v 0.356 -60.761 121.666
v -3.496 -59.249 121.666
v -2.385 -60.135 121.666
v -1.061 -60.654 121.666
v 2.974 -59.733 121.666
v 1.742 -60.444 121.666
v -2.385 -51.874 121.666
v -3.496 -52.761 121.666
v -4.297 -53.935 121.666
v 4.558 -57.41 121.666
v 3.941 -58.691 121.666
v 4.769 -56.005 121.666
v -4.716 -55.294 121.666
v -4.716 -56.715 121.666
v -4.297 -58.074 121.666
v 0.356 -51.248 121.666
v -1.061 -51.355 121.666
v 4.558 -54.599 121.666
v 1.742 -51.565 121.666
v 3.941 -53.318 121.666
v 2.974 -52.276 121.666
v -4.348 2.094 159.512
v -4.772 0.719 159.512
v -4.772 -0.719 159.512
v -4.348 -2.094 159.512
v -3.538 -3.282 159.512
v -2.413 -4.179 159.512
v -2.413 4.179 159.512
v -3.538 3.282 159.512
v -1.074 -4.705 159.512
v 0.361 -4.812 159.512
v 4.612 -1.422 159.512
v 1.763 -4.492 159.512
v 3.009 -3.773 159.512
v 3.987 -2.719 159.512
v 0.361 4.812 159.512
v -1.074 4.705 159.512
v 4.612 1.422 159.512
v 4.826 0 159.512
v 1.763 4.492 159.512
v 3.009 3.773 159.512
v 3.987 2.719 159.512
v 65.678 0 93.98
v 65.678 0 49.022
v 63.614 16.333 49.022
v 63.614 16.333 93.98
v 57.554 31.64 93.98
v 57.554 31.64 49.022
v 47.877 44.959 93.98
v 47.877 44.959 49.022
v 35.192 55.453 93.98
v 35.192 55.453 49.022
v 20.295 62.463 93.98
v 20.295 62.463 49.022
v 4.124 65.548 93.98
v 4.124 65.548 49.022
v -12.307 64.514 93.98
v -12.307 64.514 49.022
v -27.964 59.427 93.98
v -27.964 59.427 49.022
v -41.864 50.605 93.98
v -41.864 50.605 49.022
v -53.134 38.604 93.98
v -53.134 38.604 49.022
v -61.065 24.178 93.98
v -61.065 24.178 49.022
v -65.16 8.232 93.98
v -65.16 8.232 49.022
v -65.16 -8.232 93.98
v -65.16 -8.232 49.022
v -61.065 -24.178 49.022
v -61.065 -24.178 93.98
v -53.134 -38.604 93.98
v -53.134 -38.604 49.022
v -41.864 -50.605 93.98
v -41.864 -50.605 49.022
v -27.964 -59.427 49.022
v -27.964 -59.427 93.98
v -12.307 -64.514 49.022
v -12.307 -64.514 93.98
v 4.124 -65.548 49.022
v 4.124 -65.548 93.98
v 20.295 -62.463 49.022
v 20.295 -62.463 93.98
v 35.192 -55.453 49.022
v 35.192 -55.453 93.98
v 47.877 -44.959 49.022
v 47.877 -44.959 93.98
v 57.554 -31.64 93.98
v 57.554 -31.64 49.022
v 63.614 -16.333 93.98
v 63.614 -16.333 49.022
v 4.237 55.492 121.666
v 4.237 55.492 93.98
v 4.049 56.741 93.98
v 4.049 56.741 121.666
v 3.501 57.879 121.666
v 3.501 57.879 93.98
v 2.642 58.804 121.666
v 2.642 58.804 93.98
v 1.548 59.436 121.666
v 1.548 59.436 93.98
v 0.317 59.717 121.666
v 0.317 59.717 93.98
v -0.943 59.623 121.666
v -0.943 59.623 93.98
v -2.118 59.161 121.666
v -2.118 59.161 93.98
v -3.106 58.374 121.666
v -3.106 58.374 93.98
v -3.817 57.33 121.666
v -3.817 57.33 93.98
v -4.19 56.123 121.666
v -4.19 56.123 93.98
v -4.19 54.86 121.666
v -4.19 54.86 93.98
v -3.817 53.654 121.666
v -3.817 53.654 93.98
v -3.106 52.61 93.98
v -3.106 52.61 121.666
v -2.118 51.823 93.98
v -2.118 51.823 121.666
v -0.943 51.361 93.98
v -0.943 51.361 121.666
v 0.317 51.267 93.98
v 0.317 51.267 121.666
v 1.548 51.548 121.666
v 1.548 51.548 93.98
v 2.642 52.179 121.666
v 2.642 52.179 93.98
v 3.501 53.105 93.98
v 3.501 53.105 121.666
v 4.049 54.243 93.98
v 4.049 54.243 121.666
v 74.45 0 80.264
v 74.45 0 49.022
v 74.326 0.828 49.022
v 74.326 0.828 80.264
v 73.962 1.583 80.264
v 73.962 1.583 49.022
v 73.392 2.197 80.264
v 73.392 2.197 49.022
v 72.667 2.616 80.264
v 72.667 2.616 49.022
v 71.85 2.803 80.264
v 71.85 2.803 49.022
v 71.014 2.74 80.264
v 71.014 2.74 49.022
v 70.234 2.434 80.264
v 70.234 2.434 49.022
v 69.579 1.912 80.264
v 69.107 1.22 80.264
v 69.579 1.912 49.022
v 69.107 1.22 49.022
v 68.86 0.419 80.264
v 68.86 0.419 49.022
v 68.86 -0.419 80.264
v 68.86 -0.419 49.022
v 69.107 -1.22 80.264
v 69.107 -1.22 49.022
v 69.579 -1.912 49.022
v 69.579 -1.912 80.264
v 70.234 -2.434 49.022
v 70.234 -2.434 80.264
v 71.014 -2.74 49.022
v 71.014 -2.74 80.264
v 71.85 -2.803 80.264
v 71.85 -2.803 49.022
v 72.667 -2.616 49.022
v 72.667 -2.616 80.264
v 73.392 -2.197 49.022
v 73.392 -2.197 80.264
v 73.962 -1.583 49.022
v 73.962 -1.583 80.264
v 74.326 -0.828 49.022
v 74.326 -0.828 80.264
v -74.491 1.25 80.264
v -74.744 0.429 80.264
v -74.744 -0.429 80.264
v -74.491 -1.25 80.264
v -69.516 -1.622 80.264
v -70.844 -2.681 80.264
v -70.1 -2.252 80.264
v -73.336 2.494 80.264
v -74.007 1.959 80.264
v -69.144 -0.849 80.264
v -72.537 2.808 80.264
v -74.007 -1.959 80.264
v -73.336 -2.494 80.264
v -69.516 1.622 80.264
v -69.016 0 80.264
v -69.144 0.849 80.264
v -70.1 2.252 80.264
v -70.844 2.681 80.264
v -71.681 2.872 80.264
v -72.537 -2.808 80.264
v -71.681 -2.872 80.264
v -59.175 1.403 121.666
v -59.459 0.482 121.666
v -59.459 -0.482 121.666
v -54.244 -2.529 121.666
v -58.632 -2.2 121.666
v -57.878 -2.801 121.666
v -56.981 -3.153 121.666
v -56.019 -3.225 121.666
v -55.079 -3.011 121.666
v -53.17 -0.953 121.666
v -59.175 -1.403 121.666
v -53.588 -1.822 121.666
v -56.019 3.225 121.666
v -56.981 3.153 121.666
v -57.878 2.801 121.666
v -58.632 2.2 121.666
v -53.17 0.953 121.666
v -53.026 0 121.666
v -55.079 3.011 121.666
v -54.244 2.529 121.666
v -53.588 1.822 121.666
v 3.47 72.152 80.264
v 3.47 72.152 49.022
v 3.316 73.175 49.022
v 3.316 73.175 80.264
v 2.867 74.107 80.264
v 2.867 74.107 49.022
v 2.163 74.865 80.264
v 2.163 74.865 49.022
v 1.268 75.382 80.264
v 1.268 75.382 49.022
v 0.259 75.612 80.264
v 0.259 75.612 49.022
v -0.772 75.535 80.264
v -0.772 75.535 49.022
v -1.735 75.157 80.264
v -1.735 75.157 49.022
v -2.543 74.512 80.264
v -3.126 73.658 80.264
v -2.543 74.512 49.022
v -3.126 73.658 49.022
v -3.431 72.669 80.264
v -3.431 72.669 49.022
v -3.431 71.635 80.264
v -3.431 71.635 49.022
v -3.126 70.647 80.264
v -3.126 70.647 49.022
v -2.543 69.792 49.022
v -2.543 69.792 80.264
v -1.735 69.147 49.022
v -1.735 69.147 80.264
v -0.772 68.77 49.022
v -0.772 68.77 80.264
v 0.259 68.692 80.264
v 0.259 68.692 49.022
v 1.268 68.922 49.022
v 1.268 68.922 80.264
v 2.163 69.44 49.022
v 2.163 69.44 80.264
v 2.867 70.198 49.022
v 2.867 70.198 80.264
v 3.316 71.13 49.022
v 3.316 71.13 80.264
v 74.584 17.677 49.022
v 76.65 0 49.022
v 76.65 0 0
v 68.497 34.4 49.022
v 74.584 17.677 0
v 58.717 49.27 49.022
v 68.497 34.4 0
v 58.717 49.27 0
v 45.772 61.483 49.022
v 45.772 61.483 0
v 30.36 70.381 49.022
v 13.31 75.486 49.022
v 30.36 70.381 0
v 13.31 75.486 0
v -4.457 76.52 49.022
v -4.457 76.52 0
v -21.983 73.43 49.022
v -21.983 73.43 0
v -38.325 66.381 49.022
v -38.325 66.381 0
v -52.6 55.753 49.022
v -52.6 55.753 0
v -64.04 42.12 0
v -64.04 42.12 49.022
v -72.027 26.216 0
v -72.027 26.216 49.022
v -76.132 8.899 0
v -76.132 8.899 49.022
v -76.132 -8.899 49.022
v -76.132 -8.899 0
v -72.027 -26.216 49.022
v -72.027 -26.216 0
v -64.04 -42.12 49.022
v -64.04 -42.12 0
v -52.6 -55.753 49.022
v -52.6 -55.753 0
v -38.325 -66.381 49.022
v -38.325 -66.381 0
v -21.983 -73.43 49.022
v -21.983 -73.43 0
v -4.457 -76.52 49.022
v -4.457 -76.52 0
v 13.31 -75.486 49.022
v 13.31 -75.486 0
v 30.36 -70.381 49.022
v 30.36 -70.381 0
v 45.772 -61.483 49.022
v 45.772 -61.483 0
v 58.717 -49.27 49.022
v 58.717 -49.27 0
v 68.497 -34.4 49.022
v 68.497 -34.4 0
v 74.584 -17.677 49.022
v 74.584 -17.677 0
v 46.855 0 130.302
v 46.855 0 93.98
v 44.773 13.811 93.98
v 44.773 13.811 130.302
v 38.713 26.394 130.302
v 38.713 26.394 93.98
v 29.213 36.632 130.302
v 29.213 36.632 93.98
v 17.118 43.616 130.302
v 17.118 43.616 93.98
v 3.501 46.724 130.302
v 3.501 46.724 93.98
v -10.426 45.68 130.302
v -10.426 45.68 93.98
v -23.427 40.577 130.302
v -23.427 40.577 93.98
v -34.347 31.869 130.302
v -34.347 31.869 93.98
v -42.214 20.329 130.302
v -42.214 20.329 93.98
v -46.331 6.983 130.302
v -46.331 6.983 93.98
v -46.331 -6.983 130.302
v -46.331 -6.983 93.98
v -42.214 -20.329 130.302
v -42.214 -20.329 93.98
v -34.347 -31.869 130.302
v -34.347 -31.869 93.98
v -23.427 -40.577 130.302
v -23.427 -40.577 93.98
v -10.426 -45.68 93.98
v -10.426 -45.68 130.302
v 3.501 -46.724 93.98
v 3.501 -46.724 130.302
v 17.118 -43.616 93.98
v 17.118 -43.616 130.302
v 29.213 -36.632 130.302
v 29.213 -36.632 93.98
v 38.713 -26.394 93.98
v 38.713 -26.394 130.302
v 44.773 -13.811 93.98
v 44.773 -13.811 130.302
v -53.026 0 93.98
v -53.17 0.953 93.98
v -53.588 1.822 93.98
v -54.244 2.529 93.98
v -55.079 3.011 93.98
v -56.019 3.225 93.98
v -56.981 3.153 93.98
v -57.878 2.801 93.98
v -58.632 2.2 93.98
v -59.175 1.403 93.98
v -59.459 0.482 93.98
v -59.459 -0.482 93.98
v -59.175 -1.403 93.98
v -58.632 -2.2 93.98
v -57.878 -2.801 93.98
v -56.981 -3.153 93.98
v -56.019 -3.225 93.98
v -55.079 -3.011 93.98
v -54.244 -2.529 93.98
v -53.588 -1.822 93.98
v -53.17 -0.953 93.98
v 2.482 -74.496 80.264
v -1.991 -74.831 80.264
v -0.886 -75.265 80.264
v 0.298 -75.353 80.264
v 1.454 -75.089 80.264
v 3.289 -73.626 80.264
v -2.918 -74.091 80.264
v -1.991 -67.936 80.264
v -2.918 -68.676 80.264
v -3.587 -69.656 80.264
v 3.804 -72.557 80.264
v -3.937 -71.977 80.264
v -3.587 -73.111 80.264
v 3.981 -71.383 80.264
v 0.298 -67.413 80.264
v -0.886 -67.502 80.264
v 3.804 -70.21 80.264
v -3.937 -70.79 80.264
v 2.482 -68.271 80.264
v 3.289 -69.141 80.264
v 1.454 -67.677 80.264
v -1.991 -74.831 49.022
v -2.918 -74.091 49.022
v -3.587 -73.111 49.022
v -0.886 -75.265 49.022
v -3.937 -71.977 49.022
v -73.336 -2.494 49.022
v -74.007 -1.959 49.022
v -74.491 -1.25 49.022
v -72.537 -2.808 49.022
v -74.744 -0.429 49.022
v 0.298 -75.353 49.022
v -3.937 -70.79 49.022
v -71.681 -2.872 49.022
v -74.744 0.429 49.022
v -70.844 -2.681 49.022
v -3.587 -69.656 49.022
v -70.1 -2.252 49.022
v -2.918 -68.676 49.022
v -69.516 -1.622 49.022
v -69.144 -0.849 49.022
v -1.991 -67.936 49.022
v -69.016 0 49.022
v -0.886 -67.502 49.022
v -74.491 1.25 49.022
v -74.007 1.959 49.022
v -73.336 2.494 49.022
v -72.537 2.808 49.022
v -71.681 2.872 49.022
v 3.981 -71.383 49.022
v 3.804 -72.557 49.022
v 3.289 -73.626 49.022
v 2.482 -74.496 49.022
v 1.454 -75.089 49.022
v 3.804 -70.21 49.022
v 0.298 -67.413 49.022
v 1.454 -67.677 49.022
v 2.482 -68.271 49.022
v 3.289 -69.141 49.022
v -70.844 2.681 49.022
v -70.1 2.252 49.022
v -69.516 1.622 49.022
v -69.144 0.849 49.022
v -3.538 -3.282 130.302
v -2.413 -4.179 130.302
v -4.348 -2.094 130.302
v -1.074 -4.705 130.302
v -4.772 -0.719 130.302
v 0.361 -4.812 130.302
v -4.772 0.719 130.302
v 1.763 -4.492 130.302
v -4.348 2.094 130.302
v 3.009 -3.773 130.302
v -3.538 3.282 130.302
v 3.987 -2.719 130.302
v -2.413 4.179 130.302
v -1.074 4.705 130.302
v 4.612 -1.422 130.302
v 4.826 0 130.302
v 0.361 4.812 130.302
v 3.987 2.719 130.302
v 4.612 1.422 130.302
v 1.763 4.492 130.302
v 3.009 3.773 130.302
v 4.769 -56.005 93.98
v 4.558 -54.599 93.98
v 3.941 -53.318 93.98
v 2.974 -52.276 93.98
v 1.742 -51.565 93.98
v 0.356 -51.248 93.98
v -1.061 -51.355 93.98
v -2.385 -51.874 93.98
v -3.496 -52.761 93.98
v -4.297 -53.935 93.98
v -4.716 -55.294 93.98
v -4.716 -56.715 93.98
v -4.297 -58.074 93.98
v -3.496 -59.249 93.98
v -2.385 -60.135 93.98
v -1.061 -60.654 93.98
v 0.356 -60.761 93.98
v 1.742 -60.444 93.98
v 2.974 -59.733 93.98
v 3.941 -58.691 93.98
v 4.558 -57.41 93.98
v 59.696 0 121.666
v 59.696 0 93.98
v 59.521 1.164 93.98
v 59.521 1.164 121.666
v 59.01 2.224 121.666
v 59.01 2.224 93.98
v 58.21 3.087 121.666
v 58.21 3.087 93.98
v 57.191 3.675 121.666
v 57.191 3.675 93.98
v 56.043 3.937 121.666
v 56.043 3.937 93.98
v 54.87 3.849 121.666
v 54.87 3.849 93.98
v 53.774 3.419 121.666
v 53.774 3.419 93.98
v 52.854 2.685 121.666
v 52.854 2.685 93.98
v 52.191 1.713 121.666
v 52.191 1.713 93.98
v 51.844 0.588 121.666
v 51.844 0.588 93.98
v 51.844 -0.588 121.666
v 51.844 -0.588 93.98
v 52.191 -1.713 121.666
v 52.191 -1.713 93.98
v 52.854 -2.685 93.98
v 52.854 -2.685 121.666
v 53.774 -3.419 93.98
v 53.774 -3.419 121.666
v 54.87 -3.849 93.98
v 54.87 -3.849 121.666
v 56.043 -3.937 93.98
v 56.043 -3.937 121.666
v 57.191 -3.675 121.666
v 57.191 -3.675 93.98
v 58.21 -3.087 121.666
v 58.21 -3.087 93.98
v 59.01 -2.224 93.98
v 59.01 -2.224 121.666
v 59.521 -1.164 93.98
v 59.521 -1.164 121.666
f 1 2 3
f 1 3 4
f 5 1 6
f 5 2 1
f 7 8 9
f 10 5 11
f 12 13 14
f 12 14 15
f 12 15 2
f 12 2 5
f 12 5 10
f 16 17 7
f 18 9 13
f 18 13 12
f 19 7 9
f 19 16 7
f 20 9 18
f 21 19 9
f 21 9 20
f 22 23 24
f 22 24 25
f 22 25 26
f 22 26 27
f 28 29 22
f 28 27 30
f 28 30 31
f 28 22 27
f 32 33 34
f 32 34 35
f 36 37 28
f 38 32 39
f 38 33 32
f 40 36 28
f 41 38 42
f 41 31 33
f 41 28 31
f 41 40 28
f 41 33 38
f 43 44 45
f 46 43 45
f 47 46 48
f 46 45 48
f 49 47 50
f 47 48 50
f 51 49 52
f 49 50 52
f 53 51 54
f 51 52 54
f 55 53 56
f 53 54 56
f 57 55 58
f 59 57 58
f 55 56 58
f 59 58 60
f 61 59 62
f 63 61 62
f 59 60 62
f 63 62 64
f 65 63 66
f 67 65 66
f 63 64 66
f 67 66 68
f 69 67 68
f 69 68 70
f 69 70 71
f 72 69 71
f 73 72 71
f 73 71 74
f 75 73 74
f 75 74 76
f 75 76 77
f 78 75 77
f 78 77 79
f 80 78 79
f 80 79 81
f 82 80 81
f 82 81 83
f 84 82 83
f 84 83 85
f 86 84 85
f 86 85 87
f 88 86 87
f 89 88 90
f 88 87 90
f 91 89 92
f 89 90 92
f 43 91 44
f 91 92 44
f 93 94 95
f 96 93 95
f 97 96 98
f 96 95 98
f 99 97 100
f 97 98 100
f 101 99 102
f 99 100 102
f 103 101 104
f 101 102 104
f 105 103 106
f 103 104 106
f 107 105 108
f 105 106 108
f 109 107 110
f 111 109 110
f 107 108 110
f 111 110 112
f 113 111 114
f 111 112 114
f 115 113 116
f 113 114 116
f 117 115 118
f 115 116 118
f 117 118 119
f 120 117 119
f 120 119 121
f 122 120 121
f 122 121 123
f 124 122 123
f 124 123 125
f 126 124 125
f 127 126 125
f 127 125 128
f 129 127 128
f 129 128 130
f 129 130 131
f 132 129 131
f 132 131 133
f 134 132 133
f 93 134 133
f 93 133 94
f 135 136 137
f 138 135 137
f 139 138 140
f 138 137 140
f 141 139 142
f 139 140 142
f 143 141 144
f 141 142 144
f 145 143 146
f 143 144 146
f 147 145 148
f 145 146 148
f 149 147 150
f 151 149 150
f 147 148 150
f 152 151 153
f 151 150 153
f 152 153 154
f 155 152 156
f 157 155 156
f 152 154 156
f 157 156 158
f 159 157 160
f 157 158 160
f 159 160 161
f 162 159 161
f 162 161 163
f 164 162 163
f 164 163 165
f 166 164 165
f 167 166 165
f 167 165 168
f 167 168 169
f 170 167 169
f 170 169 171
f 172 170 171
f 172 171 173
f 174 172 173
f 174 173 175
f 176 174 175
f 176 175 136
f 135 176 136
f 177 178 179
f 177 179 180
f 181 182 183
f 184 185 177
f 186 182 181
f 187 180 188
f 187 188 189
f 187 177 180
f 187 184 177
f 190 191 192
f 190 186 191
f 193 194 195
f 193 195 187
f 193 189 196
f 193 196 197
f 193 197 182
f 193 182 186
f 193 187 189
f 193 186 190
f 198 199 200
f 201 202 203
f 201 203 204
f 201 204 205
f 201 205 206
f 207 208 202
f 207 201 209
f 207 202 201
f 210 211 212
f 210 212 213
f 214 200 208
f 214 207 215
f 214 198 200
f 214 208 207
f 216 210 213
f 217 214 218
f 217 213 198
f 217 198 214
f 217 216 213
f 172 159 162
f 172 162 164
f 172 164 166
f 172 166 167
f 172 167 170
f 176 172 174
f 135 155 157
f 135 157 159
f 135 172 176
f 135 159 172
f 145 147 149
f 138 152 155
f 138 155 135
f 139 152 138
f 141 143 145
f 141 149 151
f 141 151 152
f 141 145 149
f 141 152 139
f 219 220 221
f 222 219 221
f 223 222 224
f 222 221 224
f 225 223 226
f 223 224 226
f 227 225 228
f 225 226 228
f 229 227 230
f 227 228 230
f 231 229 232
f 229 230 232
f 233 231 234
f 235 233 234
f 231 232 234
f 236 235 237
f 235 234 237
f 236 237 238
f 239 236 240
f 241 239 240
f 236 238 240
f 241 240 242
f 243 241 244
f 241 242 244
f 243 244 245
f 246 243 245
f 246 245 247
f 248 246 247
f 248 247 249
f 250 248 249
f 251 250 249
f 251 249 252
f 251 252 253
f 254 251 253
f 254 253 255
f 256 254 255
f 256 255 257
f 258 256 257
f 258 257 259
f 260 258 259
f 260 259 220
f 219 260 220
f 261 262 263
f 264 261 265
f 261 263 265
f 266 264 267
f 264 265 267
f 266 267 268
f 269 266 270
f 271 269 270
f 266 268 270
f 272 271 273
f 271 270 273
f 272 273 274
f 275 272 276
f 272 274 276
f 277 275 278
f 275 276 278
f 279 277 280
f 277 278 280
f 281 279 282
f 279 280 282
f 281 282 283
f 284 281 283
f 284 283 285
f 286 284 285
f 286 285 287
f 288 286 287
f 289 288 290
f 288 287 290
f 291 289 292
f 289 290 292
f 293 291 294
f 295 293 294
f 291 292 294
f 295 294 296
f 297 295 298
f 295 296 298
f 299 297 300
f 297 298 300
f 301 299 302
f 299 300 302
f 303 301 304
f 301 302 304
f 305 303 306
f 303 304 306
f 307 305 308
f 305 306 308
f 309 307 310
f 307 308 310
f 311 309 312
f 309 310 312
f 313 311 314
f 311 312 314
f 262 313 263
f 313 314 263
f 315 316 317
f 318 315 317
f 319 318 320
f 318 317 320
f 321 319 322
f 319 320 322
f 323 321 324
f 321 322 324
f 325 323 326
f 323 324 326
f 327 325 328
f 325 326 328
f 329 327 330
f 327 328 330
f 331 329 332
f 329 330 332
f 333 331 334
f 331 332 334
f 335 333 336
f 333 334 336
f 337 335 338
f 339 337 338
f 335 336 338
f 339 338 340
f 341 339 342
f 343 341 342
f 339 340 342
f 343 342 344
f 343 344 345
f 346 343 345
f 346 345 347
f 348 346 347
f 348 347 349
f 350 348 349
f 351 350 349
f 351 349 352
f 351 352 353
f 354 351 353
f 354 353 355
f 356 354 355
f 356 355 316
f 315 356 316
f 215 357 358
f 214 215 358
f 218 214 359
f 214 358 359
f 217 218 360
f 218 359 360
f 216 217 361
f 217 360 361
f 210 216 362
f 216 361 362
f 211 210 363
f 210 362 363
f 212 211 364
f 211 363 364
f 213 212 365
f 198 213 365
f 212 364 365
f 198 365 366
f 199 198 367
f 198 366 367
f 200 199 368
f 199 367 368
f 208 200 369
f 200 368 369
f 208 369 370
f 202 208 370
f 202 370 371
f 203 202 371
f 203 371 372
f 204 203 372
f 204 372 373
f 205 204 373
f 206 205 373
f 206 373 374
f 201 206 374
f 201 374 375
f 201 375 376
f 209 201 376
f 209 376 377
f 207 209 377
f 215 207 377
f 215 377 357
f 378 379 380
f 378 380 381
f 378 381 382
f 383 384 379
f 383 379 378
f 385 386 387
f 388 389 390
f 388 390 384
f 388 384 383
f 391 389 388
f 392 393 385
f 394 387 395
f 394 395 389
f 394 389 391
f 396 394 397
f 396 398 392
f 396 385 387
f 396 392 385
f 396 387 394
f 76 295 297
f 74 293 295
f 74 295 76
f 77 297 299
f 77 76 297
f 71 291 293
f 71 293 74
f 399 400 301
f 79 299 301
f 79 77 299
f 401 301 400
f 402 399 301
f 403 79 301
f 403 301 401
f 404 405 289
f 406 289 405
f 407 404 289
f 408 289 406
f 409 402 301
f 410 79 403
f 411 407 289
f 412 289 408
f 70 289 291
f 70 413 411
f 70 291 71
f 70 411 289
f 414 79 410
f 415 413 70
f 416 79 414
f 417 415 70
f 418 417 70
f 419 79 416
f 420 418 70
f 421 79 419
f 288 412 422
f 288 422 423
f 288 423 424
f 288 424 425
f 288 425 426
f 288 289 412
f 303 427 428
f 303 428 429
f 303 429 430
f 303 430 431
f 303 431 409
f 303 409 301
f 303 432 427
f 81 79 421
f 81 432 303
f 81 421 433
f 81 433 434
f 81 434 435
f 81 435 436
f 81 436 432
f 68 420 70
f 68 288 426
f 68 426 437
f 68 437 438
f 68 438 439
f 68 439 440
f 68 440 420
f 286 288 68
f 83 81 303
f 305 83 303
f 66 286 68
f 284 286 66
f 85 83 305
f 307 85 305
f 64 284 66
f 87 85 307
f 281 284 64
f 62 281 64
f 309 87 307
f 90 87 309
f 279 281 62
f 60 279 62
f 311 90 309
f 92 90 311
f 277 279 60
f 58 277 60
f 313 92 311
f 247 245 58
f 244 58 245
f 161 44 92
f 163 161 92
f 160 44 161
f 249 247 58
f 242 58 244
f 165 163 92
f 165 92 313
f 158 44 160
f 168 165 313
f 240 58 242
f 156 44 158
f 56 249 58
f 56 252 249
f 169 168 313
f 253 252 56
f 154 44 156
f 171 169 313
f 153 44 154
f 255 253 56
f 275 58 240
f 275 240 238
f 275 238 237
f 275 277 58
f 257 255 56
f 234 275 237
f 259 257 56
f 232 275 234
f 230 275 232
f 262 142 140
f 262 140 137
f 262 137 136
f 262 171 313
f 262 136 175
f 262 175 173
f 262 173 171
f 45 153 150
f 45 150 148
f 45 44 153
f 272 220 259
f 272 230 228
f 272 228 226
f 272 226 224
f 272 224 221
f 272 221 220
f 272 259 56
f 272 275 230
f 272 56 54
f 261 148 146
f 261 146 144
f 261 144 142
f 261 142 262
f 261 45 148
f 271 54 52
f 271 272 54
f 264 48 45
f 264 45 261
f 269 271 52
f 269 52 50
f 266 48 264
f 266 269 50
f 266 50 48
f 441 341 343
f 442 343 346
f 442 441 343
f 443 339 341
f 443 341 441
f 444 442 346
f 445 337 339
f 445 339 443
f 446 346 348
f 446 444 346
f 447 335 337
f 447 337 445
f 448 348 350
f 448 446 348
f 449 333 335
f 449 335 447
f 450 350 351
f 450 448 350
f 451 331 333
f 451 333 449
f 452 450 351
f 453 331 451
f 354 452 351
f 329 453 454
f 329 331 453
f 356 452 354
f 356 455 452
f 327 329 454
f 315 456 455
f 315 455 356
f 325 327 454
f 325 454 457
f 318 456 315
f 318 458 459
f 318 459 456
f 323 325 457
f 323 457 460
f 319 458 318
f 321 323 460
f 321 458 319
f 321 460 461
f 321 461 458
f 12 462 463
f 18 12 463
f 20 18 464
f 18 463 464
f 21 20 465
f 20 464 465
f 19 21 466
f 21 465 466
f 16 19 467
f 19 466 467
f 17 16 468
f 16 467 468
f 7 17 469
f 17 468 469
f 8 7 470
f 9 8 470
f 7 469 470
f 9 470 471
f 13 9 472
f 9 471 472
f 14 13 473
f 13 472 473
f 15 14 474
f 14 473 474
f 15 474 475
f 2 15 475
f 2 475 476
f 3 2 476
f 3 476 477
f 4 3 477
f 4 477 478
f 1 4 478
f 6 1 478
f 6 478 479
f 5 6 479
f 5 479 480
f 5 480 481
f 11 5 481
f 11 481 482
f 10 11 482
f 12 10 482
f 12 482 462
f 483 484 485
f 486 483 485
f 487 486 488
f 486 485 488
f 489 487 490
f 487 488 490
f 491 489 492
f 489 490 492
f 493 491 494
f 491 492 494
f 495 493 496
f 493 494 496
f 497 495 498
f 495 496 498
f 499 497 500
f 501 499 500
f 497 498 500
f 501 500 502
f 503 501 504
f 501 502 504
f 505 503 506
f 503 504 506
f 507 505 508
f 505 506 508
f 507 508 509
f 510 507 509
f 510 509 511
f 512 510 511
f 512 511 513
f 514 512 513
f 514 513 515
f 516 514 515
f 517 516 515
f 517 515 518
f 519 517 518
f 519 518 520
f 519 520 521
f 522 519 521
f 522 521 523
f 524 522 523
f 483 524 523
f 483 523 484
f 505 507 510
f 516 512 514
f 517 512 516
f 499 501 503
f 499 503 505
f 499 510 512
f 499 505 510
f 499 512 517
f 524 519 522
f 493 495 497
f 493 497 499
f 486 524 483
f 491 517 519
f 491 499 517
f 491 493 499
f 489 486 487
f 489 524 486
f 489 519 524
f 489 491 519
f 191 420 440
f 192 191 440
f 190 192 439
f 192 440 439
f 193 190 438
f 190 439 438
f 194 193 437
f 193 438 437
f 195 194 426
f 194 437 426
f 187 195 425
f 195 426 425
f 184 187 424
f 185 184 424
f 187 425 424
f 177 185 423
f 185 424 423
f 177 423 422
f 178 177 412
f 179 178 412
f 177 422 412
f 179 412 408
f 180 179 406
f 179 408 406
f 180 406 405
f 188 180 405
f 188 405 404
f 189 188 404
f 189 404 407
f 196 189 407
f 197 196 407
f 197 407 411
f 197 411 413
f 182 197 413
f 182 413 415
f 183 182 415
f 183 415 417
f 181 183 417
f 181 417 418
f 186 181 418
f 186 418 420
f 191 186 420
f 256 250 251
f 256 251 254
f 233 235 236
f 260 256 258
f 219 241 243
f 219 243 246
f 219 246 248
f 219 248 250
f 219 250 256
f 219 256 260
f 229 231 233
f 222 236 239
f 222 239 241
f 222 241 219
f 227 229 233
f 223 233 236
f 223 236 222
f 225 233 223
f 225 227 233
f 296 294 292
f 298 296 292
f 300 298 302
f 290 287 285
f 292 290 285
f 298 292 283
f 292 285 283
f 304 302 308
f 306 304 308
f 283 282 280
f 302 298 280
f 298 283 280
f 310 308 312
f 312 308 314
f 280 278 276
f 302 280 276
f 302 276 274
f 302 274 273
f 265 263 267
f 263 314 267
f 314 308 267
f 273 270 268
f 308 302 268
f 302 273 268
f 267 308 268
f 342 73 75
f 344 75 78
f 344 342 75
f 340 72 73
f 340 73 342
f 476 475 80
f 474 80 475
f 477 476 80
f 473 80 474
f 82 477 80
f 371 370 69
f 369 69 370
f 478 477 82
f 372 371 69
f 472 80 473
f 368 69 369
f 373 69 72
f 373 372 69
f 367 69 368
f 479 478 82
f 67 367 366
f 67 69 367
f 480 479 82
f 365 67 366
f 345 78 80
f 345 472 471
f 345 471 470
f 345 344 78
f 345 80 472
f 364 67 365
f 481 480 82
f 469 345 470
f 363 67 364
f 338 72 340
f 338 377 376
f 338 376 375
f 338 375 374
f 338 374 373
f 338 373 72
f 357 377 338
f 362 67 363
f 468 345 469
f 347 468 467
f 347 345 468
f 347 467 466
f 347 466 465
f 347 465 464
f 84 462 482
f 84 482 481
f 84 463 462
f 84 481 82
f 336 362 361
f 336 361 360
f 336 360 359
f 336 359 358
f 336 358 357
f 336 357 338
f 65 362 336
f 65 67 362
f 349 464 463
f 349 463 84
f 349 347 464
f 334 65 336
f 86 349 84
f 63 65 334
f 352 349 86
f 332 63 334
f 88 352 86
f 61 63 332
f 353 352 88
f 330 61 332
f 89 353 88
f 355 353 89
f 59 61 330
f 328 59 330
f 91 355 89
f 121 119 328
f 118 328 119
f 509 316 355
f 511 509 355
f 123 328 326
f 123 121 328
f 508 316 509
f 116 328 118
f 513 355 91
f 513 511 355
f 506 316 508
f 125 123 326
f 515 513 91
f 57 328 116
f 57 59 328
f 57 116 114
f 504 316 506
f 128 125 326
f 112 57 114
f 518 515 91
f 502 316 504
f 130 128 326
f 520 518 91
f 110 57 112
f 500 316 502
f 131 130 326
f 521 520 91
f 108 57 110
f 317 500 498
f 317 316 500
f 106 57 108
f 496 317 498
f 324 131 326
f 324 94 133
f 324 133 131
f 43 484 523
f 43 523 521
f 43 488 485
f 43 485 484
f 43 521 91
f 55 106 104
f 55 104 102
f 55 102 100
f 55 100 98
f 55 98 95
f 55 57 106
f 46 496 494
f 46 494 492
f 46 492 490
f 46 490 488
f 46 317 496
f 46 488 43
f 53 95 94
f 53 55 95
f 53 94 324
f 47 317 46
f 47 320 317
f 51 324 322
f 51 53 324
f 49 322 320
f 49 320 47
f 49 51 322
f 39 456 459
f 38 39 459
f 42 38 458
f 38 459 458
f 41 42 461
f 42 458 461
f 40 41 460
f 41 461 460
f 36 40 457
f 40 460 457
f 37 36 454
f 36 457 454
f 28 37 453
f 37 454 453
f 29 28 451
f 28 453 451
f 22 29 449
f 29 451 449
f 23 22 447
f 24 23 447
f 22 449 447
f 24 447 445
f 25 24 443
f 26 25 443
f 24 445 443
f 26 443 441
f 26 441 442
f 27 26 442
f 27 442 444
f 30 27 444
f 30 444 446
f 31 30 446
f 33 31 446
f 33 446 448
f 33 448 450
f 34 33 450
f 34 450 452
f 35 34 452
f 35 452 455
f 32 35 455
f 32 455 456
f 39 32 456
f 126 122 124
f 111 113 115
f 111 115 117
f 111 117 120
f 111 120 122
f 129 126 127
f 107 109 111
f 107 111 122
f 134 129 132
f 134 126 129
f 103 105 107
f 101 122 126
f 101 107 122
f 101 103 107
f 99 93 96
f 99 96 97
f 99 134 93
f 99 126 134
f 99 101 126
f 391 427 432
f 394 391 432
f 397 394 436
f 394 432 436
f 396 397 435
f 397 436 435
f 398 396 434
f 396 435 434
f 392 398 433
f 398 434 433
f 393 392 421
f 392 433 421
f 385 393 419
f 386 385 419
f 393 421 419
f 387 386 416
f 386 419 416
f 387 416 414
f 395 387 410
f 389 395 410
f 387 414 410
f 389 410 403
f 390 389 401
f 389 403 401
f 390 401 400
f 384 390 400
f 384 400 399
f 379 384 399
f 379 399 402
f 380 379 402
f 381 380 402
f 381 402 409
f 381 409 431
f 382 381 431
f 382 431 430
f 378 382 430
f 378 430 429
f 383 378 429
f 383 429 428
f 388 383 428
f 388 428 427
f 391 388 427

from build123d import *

# Parameters (mm, degrees)
F0_R      = 76.650002
F1_DEPTH  = 49.022
F2_R      = 65.6775
F3_DEPTH  = 93.98
F4_R      = 46.85452
F5_DEPTH  = 130.302
F6_R      = 2.879966
F6_R_2    = 2.810701
F6_R_3    = 3.469715
F6_R_4    = 3.981124
F7_DEPTH  = 80.264
F8_R      = 3.234533
F8_R_2    = 3.947979
F8_R_3    = 4.769434
F8_R_4    = 4.236935
F8_R_5    = 3.405214
F9_DEPTH  = 121.666
F10_R     = 4.825919
F11_DEPTH = 159.512


with BuildPart() as f1:
    # F0 (on Top) → F1 (new body)
    with BuildSketch(Plane.XY):
        Circle(F0_R)
    extrude(amount=F1_DEPTH)

    # F2 (on Top) → F3 (join)
    with BuildSketch(Plane.XY):
        Circle(F2_R)
    extrude(amount=F3_DEPTH)

    # F4 (on Top) → F5 (join)
    with BuildSketch(Plane.XY):
        Circle(F4_R)
    extrude(amount=F5_DEPTH)

    # F6 (on Top) → F7 (join)
    with BuildSketch(Plane.XY):
        with Locations((-71.895994, 0)):
            Circle(F6_R)
        with Locations((71.639679, 0)):
            Circle(F6_R_2)
        with Locations((0, 72.152309)):
            Circle(F6_R_3)
        with Locations((0, -71.383364)):
            Circle(F6_R_4)
    extrude(amount=F7_DEPTH)

    # F8 (on Top) → F9 (join)
    with BuildSketch(Plane.XY):
        with Locations((-56.260858, 0)):
            Circle(F8_R)
        with Locations((55.748228, 0)):
            Circle(F8_R_2)
        with Locations((0, -56.004543)):
            Circle(F8_R_3)
        with Locations((0, 55.491913)):
            Circle(F8_R_4)
        Circle(F8_R_5)
    extrude(amount=F9_DEPTH)

    # F10 (on Top) → F11 (join)
    with BuildSketch(Plane.XY):
        Circle(F10_R)
    extrude(amount=F11_DEPTH)


solid = f1.part
